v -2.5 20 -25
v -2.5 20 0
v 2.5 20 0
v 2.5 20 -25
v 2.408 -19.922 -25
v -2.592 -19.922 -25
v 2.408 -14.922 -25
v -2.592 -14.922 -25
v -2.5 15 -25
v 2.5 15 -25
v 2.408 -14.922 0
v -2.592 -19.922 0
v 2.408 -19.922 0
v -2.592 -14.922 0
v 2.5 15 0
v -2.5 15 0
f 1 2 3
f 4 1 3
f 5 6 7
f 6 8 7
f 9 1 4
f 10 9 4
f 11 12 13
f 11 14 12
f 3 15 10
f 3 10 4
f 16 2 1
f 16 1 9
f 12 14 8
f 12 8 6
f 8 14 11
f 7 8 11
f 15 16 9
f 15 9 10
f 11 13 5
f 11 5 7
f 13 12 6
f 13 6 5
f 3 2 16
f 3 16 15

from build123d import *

# Parameters (mm, degrees)
F0_W     = 5
F0_H     = 2.421532
F0_H_2   = 2.578468
F0_H_3   = 2.5
F1_DEPTH = 25


with BuildPart() as f1:
    # F0 (on Top) → F1 (new body)
    with BuildSketch(Plane.XY):
        with Locations((-0.092013, -18.710766)):
            Rectangle(F0_W, F0_H)
        with Locations((-0.092013, -16.210766)):
            Rectangle(F0_W, F0_H_2)
        with Locations((0, 18.75)):
            Rectangle(F0_W, F0_H_3)
        with Locations((0, 16.25)):
            Rectangle(F0_W, F0_H_3)
    extrude(amount=-F1_DEPTH)


solid = f1.part
